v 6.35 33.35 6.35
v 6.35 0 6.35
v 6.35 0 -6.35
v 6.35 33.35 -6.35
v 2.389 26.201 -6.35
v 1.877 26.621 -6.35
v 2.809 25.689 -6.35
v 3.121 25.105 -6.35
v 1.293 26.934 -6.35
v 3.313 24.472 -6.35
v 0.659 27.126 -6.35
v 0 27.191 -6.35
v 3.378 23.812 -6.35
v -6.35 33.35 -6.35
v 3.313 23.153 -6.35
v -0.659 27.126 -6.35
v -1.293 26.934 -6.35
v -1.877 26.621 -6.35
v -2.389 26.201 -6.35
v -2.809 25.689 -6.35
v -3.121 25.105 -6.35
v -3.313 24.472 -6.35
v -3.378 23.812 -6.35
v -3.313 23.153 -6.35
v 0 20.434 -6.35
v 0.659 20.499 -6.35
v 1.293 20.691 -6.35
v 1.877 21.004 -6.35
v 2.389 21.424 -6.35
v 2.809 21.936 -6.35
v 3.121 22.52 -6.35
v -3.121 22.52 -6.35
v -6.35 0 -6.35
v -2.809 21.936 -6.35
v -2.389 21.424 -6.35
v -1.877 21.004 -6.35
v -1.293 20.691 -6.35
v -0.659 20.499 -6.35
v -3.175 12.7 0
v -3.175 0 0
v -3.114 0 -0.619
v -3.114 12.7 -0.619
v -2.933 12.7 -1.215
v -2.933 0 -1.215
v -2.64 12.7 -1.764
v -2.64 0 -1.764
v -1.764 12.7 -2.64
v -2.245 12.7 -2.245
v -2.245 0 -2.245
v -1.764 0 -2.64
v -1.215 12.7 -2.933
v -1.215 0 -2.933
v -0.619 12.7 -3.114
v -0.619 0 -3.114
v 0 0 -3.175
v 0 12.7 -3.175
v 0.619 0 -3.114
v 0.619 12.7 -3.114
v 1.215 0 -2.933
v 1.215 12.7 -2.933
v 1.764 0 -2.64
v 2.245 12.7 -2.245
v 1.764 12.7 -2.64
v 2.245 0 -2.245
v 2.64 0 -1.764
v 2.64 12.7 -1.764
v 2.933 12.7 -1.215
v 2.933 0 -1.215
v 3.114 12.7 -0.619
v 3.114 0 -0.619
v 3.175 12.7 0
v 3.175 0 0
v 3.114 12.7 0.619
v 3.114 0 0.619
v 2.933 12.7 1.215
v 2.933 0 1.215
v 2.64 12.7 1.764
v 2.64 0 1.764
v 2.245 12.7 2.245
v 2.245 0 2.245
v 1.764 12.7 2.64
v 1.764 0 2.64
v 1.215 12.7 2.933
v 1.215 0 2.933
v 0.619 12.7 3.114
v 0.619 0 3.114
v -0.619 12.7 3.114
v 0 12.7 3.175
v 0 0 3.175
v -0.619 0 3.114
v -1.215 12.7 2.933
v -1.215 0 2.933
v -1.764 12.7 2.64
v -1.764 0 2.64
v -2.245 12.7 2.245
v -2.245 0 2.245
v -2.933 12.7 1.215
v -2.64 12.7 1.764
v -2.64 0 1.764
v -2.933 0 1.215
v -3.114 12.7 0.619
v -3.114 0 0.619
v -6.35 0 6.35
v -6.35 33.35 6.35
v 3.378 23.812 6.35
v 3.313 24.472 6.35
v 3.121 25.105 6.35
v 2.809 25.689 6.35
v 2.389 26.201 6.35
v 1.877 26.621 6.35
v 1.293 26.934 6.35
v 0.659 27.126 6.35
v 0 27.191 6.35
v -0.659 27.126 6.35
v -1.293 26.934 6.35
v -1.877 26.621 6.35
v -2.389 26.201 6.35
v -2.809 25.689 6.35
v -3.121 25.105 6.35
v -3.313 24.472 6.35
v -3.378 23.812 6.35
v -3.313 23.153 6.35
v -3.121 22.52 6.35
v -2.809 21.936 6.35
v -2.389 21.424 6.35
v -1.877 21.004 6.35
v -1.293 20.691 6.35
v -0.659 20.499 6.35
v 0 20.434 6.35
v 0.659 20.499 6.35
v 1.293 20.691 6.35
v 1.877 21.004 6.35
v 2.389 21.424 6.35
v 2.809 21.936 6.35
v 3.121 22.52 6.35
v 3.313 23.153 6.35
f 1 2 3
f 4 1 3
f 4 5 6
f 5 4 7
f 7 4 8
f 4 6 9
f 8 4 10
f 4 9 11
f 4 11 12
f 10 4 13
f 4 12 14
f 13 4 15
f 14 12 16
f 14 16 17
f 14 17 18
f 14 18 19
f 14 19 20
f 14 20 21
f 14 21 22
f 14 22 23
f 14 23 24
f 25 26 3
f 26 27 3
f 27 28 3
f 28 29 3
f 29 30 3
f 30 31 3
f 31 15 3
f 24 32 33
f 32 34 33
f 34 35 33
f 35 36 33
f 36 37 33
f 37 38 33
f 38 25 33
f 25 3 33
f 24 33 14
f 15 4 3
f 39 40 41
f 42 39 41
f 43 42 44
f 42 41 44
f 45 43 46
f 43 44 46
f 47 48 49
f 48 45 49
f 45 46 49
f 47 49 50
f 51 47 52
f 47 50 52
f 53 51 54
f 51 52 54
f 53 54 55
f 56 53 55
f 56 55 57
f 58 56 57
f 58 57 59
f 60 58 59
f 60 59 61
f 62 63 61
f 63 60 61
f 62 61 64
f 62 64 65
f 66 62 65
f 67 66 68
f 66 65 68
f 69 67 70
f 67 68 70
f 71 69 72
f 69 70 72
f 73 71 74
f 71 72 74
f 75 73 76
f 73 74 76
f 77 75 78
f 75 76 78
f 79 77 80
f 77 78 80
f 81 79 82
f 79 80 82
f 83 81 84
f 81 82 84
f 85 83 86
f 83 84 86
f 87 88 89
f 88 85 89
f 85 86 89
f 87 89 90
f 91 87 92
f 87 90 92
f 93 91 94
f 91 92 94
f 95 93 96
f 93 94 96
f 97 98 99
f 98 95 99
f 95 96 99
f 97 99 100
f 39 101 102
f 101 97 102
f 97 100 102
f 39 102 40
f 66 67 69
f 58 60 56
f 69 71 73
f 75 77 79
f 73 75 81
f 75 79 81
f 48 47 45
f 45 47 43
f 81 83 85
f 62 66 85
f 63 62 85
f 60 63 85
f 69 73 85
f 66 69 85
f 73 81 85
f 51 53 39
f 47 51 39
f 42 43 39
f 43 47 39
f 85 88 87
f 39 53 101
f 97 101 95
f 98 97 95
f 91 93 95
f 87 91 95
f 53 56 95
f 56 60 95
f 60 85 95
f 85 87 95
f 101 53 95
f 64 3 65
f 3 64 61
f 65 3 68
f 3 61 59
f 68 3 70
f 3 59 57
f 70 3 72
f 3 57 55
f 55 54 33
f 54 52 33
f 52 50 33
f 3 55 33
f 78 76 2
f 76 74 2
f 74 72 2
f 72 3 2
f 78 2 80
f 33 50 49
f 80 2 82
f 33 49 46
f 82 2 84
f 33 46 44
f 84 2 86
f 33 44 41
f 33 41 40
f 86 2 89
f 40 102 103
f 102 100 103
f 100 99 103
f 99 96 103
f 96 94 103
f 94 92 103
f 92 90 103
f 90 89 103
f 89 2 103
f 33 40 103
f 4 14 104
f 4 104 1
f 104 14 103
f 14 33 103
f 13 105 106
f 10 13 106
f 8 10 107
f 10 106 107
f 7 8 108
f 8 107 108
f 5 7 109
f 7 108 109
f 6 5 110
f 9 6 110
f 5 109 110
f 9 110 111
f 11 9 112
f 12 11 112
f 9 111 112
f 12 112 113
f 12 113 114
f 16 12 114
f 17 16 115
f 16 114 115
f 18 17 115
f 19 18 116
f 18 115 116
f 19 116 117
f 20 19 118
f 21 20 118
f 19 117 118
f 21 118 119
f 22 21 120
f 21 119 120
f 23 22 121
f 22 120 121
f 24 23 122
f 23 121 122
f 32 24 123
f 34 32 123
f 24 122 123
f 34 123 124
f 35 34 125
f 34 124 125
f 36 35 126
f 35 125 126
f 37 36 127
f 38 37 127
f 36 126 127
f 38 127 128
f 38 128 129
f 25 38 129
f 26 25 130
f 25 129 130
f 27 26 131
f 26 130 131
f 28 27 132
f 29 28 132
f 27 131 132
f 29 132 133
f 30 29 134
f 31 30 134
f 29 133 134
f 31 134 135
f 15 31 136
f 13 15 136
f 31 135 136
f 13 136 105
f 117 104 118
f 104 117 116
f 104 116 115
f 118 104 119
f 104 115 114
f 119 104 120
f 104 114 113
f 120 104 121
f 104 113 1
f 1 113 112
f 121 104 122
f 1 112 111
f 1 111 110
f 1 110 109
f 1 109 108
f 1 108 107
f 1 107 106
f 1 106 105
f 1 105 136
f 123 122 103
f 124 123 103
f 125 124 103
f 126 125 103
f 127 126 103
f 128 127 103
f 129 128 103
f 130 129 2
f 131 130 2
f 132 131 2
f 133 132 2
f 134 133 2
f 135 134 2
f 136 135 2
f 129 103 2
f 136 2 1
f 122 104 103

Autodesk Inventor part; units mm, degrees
ref_plane "YZ Plane" through (0, 0, 0) normal (1, 0, 0) x (0, 1, 0)
ref_plane "XZ Plane" through (0, 0, 0) normal (0, 1, 0) x (-1, 0, 0)
ref_plane "XY Plane" through (0, 0, 0) normal (0, 0, 1) x (1, 0, 0)
sketch "Sketch1" plane through (0, 0, 0) normal (0, 1, 0) x (-1, 0, 0)
  circle A0 centre (0, 0) radius 3.175
  line L0 (6.35, 6.35) -> (-6.35, 6.35)
  line L1 (-6.35, 6.35) -> (-6.35, -6.35)
  line L2 (-6.35, -6.35) -> (6.35, -6.35)
  line L3 (6.35, -6.35) -> (6.35, 6.35)
  dimension "d0" = 6.35
  dimension "d1" = 6.35
  dimension "d2" = 6.35
  dimension "d3" = 6.35
extrude "Extrusion1" add sketch "Sketch1" along normal blind 30.1752 contours A0 | L3 L2 L1 L0
extrude "Extrusion2" cut sketch "Sketch1" along normal blind 12.7 contours A0
sketch "Sketch2" plane through (-6.35, 0, 6.35) normal (0, 0, 1) x (1, 0, 0)
  circle A0 centre (6.35, 23.8125) radius 3.3782
  line L0 (12.7, 0) -> (12.7, 30.1752) projected
  point P0 (6.35, 0)
  dimension "d8" = 6.7564
  dimension "d9" = 23.8125
  dimension "d10" = 6.35
extrude "Extrusion3" cut sketch "Sketch2" against normal blind 12.7
sketch "Sketch3" plane through (0, 30.1752, 0) normal (0, 1, 0) x (1, 0, 0)
  line L0 (6.35, -6.35) -> (6.35, 6.35) projected
  line L1 (6.35, 6.35) -> (-6.35, 6.35) projected
  line L2 (-6.35, 6.35) -> (-6.35, -6.35) projected
  line L3 (-6.35, -6.35) -> (6.35, -6.35) projected
  point P0 (0, 0)
extrude "Extrusion4" add sketch "Sketch3" along normal blind 3.175
properties part number "clevis"
